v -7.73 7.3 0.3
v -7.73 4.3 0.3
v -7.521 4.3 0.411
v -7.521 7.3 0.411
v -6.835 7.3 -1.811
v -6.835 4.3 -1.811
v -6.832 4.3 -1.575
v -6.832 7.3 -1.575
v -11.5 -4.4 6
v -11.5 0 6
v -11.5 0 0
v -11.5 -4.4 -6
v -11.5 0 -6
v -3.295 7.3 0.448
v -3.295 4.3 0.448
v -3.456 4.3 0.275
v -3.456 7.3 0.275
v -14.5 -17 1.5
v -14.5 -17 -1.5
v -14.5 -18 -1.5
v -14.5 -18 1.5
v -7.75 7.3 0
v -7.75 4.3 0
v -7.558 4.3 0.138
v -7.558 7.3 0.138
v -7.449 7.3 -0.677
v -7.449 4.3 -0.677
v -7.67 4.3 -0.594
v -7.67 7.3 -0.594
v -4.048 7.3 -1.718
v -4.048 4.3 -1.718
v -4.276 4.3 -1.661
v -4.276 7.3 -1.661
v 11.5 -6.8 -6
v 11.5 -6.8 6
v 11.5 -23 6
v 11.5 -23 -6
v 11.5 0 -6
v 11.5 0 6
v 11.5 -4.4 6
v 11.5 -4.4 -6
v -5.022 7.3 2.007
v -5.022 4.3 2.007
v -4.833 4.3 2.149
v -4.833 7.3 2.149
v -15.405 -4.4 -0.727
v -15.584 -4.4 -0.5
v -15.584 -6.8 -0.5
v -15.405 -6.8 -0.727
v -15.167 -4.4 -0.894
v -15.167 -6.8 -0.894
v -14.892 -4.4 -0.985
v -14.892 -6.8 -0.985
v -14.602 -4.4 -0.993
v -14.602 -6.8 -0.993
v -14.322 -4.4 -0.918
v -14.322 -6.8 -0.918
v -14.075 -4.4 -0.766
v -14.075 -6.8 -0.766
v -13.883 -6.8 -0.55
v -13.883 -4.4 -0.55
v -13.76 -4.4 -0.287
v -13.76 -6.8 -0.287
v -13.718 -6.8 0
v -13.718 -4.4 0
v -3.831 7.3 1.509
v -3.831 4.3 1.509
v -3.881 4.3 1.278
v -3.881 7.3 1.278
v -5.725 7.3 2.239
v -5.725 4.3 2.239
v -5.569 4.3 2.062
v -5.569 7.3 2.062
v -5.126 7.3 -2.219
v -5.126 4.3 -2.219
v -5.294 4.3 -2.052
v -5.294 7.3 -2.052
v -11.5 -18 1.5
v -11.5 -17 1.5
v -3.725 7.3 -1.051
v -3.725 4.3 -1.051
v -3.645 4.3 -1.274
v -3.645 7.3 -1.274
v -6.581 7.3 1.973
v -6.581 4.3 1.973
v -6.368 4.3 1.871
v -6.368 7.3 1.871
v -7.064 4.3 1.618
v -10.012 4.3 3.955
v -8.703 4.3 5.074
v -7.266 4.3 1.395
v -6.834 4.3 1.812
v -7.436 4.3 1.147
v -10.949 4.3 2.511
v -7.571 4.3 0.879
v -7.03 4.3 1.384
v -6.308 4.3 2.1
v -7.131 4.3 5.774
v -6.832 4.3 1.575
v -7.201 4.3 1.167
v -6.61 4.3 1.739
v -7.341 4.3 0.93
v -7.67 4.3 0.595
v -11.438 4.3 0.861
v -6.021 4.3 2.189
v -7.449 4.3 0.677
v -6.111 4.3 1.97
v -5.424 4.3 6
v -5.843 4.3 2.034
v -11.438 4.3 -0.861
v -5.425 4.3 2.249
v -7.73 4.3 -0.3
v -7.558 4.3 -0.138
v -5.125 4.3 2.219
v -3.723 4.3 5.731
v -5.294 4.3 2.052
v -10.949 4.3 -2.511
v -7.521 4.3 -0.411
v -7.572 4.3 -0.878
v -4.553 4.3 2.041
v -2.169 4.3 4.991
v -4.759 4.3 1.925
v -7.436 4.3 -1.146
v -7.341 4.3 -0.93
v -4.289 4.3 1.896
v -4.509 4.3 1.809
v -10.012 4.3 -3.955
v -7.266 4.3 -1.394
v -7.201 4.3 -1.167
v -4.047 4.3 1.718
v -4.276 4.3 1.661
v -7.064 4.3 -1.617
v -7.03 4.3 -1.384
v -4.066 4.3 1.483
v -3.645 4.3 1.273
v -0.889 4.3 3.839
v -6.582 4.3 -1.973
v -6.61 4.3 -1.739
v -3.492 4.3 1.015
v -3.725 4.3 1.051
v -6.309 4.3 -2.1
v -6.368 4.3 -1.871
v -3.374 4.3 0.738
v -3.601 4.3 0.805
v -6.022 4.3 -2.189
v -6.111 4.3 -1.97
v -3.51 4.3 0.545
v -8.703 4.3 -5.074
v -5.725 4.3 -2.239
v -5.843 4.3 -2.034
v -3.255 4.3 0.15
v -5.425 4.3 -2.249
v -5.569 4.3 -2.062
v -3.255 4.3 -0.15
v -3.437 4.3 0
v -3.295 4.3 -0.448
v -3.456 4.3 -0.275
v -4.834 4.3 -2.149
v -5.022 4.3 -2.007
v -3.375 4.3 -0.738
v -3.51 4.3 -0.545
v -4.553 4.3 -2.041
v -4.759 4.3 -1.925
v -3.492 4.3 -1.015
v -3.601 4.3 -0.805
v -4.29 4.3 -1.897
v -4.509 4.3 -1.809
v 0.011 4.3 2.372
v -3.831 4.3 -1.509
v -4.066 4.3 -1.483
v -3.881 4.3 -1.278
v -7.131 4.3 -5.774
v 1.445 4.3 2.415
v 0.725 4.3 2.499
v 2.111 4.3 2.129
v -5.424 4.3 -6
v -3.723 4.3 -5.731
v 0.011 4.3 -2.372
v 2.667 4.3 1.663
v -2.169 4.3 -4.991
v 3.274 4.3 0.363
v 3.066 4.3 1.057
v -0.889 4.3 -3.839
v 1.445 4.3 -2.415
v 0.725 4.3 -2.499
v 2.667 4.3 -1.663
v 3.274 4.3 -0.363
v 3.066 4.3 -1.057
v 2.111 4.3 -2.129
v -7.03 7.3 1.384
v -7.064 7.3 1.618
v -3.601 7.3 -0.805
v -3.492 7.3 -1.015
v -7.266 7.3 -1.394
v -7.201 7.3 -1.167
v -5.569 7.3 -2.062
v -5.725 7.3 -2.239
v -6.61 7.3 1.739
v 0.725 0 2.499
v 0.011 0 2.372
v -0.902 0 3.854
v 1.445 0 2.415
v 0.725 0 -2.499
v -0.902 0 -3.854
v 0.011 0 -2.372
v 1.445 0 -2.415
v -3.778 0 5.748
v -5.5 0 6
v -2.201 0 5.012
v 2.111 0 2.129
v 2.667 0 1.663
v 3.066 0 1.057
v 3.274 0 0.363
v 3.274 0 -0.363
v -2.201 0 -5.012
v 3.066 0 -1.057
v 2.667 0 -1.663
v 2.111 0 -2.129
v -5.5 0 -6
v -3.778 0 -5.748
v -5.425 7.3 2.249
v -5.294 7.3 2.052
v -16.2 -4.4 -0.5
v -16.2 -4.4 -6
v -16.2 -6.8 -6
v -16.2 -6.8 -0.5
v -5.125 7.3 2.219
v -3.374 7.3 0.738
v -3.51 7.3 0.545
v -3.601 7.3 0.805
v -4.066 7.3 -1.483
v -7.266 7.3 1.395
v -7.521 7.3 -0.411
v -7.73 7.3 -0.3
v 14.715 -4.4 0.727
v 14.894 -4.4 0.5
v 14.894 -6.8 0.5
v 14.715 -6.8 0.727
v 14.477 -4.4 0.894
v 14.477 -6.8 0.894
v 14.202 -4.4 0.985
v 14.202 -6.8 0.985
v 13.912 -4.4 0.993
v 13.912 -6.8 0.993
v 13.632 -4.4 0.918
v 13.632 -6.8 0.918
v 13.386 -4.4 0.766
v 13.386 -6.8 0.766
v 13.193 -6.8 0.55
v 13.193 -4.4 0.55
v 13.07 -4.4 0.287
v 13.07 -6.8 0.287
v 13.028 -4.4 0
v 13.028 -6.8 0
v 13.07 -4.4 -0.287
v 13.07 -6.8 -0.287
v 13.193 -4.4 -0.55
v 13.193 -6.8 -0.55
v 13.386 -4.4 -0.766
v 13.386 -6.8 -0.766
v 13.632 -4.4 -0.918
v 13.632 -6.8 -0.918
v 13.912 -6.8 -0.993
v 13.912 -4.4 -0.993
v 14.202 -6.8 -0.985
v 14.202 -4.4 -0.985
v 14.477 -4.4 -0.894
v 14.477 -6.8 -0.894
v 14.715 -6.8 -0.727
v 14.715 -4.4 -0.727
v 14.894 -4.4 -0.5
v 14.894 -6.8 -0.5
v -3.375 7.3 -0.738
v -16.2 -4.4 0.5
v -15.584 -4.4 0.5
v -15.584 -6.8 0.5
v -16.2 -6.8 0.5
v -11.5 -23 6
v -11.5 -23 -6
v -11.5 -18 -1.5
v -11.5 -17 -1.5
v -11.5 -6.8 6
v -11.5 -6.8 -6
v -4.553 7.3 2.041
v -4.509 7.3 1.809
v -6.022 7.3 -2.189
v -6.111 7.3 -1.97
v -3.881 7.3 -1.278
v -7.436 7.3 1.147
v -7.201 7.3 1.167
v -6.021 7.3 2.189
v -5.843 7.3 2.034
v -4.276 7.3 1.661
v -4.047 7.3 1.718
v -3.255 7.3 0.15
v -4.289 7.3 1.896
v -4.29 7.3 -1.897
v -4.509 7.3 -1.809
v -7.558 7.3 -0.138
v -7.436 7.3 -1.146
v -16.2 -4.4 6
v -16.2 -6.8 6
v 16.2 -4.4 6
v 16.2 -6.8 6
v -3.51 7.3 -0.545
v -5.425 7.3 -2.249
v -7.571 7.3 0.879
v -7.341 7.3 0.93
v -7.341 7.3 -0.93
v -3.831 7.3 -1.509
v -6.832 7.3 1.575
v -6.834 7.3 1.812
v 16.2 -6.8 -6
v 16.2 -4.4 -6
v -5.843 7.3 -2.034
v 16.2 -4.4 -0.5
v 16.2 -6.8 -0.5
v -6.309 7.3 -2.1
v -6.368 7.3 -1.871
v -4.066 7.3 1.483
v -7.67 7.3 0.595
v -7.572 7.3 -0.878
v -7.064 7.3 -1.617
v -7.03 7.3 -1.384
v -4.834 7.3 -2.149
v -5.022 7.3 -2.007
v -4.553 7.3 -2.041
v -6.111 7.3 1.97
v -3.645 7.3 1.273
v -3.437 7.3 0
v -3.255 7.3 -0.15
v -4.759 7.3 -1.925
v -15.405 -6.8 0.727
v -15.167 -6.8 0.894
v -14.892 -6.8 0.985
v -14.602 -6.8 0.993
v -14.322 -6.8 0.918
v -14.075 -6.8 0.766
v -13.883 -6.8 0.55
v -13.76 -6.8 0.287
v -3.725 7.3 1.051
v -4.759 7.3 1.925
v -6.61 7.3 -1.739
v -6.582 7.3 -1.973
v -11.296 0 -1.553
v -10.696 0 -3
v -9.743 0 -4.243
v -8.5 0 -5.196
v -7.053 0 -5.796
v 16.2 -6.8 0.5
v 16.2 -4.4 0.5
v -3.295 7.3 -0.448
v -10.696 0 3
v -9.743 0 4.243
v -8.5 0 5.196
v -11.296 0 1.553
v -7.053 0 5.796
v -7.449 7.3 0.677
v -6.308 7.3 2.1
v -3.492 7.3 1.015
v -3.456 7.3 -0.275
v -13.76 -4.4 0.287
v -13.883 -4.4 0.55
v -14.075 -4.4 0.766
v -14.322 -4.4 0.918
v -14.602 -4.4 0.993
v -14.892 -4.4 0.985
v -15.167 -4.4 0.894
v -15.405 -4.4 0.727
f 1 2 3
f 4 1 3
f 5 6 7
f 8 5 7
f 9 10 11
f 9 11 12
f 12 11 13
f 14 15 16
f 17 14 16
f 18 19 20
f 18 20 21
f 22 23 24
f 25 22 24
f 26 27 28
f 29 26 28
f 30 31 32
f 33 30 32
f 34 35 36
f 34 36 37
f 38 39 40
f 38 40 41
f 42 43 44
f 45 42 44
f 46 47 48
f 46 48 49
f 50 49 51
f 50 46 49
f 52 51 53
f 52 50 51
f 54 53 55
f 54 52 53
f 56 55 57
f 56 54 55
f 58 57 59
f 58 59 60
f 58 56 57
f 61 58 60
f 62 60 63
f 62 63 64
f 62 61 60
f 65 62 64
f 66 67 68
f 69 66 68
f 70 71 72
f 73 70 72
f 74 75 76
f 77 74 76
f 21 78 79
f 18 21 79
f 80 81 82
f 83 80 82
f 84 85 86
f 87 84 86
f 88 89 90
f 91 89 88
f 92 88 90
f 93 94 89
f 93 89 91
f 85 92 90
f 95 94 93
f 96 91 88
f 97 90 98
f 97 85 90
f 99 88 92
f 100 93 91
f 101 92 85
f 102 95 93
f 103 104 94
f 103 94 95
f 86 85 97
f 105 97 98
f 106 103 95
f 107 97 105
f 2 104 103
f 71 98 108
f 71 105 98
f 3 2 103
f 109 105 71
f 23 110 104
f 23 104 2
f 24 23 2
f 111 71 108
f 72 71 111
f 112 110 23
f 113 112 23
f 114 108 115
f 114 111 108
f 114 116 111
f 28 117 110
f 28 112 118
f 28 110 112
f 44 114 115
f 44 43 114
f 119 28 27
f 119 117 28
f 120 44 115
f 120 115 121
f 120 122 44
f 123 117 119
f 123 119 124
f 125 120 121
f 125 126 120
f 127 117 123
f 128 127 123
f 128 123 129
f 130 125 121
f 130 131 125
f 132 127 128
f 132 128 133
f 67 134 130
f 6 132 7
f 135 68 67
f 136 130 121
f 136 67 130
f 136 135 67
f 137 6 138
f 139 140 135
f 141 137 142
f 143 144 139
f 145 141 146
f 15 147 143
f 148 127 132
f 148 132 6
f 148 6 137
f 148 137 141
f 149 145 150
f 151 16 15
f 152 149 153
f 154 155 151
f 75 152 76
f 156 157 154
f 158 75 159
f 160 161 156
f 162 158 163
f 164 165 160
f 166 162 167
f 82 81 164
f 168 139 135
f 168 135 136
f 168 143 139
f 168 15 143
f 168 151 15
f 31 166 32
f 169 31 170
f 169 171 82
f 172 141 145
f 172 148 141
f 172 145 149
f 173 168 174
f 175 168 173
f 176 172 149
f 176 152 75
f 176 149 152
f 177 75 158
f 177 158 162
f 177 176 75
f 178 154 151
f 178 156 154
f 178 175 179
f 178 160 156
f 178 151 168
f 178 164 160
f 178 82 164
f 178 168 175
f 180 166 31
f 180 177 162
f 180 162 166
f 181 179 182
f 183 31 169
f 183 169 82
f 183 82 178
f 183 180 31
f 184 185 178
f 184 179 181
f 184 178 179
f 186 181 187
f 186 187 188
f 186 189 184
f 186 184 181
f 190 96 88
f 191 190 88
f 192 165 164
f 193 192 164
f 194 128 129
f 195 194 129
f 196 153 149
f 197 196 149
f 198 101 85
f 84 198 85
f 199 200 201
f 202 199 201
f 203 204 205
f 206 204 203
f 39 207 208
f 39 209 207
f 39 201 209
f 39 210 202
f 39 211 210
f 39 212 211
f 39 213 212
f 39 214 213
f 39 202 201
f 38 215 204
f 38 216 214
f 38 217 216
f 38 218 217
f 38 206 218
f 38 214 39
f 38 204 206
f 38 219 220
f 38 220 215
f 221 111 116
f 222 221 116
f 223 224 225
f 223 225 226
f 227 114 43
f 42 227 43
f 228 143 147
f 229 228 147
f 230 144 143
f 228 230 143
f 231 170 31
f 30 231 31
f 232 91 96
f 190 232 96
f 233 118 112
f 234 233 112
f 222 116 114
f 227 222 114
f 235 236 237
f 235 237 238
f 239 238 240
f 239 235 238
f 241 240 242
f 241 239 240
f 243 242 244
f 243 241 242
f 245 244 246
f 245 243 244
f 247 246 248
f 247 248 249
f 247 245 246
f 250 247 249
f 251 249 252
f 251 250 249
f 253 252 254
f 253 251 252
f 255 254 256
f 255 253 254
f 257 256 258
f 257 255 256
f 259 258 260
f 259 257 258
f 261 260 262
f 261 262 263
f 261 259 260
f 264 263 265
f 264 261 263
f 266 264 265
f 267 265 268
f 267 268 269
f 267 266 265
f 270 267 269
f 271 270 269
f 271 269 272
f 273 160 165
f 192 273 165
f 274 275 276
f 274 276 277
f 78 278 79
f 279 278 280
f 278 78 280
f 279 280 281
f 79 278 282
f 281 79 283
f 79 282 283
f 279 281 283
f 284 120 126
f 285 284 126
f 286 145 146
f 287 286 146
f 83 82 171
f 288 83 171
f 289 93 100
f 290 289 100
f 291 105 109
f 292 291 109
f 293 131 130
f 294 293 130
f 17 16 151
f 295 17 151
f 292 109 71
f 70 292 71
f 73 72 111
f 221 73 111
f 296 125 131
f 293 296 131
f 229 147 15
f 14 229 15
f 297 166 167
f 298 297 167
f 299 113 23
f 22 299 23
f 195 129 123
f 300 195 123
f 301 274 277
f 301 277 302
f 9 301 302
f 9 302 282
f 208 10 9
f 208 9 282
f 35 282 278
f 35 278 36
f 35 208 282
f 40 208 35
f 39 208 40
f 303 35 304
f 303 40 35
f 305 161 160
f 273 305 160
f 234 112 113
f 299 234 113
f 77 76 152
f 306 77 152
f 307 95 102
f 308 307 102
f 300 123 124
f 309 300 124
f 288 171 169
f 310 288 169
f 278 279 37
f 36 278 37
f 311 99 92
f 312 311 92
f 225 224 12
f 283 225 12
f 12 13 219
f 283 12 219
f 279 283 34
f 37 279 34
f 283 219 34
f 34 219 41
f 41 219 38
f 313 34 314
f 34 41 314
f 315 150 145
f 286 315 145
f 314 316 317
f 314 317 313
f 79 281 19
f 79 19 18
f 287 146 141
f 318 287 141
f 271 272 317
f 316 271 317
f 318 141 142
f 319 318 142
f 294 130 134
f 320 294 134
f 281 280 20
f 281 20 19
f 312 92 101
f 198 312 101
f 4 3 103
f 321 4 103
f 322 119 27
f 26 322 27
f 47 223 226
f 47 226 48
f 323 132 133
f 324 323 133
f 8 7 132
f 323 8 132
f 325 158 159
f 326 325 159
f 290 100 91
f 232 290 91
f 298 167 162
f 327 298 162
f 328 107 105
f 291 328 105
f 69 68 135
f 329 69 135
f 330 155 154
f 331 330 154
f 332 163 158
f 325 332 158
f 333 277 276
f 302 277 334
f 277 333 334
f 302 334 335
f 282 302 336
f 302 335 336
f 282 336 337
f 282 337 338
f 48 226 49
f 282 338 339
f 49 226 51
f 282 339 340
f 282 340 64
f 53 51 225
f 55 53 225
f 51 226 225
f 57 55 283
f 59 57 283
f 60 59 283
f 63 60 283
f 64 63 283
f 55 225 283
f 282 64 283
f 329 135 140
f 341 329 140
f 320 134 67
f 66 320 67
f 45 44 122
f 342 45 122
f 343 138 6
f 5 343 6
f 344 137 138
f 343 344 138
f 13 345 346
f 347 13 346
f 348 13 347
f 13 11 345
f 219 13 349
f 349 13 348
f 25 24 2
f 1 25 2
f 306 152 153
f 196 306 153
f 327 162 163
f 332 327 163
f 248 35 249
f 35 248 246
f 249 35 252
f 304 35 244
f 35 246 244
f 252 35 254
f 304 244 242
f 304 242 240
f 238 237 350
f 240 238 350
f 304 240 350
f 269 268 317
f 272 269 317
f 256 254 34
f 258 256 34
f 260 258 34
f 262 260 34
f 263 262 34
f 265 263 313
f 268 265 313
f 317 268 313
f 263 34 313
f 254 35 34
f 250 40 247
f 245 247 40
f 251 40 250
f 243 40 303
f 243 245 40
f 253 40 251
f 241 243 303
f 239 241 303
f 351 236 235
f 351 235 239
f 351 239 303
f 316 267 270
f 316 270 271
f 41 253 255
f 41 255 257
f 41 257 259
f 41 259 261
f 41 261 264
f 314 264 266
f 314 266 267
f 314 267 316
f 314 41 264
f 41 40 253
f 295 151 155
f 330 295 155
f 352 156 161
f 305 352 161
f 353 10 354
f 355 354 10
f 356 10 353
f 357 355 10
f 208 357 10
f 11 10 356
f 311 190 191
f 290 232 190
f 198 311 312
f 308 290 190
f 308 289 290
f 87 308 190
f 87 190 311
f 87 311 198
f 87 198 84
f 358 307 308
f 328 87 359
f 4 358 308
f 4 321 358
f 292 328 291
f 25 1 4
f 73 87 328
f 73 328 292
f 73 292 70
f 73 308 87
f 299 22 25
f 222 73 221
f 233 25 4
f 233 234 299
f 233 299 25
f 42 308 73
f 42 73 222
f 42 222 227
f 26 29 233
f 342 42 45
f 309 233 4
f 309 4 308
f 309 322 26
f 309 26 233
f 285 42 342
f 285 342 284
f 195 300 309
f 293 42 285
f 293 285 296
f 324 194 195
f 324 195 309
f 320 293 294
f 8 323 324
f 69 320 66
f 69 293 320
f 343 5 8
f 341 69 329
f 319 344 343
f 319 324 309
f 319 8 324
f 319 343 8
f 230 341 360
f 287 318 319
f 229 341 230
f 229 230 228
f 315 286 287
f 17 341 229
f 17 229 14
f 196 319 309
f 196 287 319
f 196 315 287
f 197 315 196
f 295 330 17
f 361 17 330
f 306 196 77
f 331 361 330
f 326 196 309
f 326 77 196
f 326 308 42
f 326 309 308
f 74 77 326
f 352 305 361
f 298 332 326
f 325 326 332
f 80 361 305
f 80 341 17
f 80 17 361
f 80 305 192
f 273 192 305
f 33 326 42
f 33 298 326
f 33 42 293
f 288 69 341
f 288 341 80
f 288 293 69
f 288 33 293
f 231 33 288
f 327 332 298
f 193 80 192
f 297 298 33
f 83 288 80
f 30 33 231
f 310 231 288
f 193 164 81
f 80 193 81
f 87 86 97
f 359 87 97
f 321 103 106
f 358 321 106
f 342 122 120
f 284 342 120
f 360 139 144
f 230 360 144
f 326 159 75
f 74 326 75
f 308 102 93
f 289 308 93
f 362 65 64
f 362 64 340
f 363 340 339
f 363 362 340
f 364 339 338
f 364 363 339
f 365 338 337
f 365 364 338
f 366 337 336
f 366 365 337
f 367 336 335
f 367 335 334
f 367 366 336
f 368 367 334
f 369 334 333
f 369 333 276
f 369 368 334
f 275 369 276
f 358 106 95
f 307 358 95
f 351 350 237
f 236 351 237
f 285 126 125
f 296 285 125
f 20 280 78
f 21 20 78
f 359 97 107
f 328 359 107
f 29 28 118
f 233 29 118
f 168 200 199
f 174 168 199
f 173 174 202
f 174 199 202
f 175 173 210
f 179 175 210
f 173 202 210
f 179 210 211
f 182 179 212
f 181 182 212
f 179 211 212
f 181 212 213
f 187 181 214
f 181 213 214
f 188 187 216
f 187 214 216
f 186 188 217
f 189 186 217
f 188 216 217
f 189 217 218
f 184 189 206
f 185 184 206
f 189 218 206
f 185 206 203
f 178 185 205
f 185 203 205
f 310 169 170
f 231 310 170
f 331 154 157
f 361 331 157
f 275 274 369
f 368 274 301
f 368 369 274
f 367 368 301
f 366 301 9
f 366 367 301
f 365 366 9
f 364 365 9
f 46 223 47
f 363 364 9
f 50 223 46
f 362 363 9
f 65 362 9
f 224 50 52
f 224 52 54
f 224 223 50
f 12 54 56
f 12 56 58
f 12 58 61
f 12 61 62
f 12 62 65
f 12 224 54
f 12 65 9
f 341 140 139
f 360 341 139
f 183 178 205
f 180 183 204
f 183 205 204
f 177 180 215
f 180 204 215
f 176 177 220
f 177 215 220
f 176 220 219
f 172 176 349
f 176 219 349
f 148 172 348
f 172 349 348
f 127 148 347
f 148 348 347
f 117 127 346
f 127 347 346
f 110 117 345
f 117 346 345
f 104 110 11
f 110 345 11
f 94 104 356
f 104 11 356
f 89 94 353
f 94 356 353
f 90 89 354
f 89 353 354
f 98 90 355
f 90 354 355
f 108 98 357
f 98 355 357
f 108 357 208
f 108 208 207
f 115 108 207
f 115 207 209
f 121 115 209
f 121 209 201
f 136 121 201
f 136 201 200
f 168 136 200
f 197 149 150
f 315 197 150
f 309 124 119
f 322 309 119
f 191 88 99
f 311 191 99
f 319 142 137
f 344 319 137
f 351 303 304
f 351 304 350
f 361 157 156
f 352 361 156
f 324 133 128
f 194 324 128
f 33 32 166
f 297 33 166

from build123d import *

# Parameters (mm, degrees)
SKETCH2_W           = 23
SKETCH2_H           = 12
BOSS_EXTRUDE1_DEPTH = 23
BOSS_EXTRUDE2_START = -4.4
BOSS_EXTRUDE2_DEPTH = 2.4
SKETCH4_R           = 6
SKETCH4_R_2         = 2.5
BOSS_EXTRUDE3_DEPTH = 4.3
BOSS_EXTRUDE4_DEPTH = 3
SKETCH6_W           = 3
SKETCH6_H           = 1
BOSS_EXTRUDE5_DEPTH = 3


with BuildPart() as part:
    # Sketch2 → Boss-Extrude1 (new body)
    with BuildSketch(Plane(origin=(0, 0, 0), x_dir=(1, 0, 0), z_dir=(0, 1, 0))):
        Rectangle(SKETCH2_W, SKETCH2_H)
    extrude(amount=-BOSS_EXTRUDE1_DEPTH)

    # Sketch3 → Boss-Extrude2 (add)
    with BuildSketch(Plane(origin=(0, 0, 0), x_dir=(1, 0, 0), z_dir=(0, 1, 0)).offset(BOSS_EXTRUDE2_START)):
        with BuildLine():
            Line((-16.2, -0.5), (-16.2, -6))
            Line((-16.2, -6), (-11.5, -6))
            Line((-11.5, -6), (-11.5, 6))
            Line((-11.5, 6), (-16.2, 6))
            Line((-16.2, 6), (-16.2, 0.5))
            Line((-16.2, 0.5), (-15.584293743, 0.5))
            ThreePointArc((-15.584293743, 0.5), (-14.459449294, 0.965925826), (-13.718268339, 0))
            ThreePointArc((-13.718268339, 0), (-14.459449294, -0.965925826), (-15.584293743, -0.5))
            Line((-15.584293743, -0.5), (-16.2, -0.5))
        make_face()
        with BuildLine():
            Line((11.5, 6), (11.5, -6))
            Line((11.5, -6), (16.2, -6))
            Line((16.2, -6), (16.2, -0.5))
            Line((16.2, -0.5), (14.894380034, -0.5))
            ThreePointArc((14.894380034, -0.5), (13.02835463, 0), (14.894380034, 0.5))
            Line((14.894380034, 0.5), (16.2, 0.5))
            Line((16.2, 0.5), (16.2, 6))
            Line((16.2, 6), (11.5, 6))
        make_face()
    extrude(amount=-BOSS_EXTRUDE2_DEPTH)

    # Sketch4 → Boss-Extrude3 (add)
    with BuildSketch(Plane(origin=(0, 0, 0), x_dir=(1, 0, 0), z_dir=(0, 1, 0))):
        with Locations((-5.5, 0)):
            Circle(SKETCH4_R)
        with Locations((0.8, 0)):
            Circle(SKETCH4_R_2)
    extrude(amount=BOSS_EXTRUDE3_DEPTH)

    # Sketch5 → Boss-Extrude4 (add)
    with BuildSketch(Plane(origin=(0, 4.3, 0), x_dir=(1, 0, 0), z_dir=(0, 1, 0))):
        Polygon((-3.255005568, -0.15), (-3.437184296, 0), (-3.255005568, 0.15), (-3.455589794, 0.274946425), (-3.295142762, 0.44844683), (-3.51047784, 0.544986424), (-3.374587739, 0.738324266), (-3.600868956, 0.805301127), (-3.491960749, 1.015026288), (-3.725150111, 1.051245213), (-3.645167266, 1.273615142), (-3.881103504, 1.278429803), (-3.831473318, 1.509476304), (-4.065946143, 1.482800783), (-4.047554268, 1.718400825), (-4.276379508, 1.660711148), (-4.289554146, 1.896660443), (-4.508648409, 1.808986083), (-4.553154459, 2.04107411), (-4.758608002, 1.924979619), (-4.833651254, 2.149064761), (-5.021797754, 2.006621847), (-5.126039057, 2.218705301), (-5.293521035, 2.052455862), (-5.425100203, 2.248752992), (-5.568928939, 2.061663752), (-5.725497937, 2.238671633), (-5.843106805, 2.034081205), (-6.021871655, 2.188641125), (-6.111161921, 1.97020043), (-6.308932561, 2.099554265), (-6.368310838, 1.871161381), (-6.581558046, 1.973000809), (-6.609964728, 1.738731414), (-6.834883102, 1.811239107), (-6.831811271, 1.575273743), (-7.064387138, 1.6171558), (-7.02989161, 1.383705275), (-7.265974648, 1.39421431), (-7.200670997, 1.167444554), (-7.436048299, 1.146393032), (-7.34110187, 0.930350756), (-7.571573122, 0.878114343), (-7.448678237, 0.676654828), (-7.670130674, 0.594165683), (-7.521480394, 0.410883978), (-7.729962192, 0.299614123), (-7.558209186, 0.137780894), (-7.749999982, -0.000284059), (-7.558209186, -0.137780894), (-7.729886469, -0.300177172), (-7.521480394, -0.410883978), (-7.669980579, -0.594713616), (-7.448678237, -0.676654828), (-7.571351335, -0.878637381), (-7.34110187, -0.930350756), (-7.435758777, -1.146881842), (-7.200670997, -1.167444554), (-7.265622557, -1.394660168), (-7.02989161, -1.383705275), (-7.063978761, -1.617550752), (-6.831811271, -1.575273743), (-6.834425728, -1.811576103), (-6.609964728, -1.738731414), (-6.581059835, -1.973273836), (-6.368310838, -1.871161381), (-6.308402404, -2.099758451), (-6.111161921, -1.97020043), (-6.021319013, -2.188772827), (-5.843106805, -2.034081205), (-5.724932672, -2.238728499), (-5.568928939, -2.061663752), (-5.424532402, -2.248734009), (-5.293521035, -2.052455862), (-5.125478853, -2.218610806), (-5.021797754, -2.006621847), (-4.833108643, -2.148896442), (-4.758608002, -1.924979619), (-4.552639125, -2.040834969), (-4.508648409, -1.808986083), (-4.289075284, -1.896354748), (-4.276379508, -1.660711148), (-4.047120423, -1.718034032), (-4.065946143, -1.482800783), (-3.831092233, -1.509054958), (-3.881103504, -1.278429803), (-3.644845742, -1.273146762), (-3.725150111, -1.051245213), (-3.491704522, -1.014519232), (-3.600868956, -0.805301127), (-3.374401382, -0.737787582), (-3.51047784, -0.544986424), (-3.295029601, -0.447890096), (-3.455589794, -0.274946425), align=None)
    extrude(amount=BOSS_EXTRUDE4_DEPTH)

    # Sketch6 → Boss-Extrude5 (add)
    with BuildSketch(Plane.ZY.offset(11.5)):
        with Locations((0, -17.5)):
            Rectangle(SKETCH6_W, SKETCH6_H)
    extrude(amount=BOSS_EXTRUDE5_DEPTH)


solid = part.part
